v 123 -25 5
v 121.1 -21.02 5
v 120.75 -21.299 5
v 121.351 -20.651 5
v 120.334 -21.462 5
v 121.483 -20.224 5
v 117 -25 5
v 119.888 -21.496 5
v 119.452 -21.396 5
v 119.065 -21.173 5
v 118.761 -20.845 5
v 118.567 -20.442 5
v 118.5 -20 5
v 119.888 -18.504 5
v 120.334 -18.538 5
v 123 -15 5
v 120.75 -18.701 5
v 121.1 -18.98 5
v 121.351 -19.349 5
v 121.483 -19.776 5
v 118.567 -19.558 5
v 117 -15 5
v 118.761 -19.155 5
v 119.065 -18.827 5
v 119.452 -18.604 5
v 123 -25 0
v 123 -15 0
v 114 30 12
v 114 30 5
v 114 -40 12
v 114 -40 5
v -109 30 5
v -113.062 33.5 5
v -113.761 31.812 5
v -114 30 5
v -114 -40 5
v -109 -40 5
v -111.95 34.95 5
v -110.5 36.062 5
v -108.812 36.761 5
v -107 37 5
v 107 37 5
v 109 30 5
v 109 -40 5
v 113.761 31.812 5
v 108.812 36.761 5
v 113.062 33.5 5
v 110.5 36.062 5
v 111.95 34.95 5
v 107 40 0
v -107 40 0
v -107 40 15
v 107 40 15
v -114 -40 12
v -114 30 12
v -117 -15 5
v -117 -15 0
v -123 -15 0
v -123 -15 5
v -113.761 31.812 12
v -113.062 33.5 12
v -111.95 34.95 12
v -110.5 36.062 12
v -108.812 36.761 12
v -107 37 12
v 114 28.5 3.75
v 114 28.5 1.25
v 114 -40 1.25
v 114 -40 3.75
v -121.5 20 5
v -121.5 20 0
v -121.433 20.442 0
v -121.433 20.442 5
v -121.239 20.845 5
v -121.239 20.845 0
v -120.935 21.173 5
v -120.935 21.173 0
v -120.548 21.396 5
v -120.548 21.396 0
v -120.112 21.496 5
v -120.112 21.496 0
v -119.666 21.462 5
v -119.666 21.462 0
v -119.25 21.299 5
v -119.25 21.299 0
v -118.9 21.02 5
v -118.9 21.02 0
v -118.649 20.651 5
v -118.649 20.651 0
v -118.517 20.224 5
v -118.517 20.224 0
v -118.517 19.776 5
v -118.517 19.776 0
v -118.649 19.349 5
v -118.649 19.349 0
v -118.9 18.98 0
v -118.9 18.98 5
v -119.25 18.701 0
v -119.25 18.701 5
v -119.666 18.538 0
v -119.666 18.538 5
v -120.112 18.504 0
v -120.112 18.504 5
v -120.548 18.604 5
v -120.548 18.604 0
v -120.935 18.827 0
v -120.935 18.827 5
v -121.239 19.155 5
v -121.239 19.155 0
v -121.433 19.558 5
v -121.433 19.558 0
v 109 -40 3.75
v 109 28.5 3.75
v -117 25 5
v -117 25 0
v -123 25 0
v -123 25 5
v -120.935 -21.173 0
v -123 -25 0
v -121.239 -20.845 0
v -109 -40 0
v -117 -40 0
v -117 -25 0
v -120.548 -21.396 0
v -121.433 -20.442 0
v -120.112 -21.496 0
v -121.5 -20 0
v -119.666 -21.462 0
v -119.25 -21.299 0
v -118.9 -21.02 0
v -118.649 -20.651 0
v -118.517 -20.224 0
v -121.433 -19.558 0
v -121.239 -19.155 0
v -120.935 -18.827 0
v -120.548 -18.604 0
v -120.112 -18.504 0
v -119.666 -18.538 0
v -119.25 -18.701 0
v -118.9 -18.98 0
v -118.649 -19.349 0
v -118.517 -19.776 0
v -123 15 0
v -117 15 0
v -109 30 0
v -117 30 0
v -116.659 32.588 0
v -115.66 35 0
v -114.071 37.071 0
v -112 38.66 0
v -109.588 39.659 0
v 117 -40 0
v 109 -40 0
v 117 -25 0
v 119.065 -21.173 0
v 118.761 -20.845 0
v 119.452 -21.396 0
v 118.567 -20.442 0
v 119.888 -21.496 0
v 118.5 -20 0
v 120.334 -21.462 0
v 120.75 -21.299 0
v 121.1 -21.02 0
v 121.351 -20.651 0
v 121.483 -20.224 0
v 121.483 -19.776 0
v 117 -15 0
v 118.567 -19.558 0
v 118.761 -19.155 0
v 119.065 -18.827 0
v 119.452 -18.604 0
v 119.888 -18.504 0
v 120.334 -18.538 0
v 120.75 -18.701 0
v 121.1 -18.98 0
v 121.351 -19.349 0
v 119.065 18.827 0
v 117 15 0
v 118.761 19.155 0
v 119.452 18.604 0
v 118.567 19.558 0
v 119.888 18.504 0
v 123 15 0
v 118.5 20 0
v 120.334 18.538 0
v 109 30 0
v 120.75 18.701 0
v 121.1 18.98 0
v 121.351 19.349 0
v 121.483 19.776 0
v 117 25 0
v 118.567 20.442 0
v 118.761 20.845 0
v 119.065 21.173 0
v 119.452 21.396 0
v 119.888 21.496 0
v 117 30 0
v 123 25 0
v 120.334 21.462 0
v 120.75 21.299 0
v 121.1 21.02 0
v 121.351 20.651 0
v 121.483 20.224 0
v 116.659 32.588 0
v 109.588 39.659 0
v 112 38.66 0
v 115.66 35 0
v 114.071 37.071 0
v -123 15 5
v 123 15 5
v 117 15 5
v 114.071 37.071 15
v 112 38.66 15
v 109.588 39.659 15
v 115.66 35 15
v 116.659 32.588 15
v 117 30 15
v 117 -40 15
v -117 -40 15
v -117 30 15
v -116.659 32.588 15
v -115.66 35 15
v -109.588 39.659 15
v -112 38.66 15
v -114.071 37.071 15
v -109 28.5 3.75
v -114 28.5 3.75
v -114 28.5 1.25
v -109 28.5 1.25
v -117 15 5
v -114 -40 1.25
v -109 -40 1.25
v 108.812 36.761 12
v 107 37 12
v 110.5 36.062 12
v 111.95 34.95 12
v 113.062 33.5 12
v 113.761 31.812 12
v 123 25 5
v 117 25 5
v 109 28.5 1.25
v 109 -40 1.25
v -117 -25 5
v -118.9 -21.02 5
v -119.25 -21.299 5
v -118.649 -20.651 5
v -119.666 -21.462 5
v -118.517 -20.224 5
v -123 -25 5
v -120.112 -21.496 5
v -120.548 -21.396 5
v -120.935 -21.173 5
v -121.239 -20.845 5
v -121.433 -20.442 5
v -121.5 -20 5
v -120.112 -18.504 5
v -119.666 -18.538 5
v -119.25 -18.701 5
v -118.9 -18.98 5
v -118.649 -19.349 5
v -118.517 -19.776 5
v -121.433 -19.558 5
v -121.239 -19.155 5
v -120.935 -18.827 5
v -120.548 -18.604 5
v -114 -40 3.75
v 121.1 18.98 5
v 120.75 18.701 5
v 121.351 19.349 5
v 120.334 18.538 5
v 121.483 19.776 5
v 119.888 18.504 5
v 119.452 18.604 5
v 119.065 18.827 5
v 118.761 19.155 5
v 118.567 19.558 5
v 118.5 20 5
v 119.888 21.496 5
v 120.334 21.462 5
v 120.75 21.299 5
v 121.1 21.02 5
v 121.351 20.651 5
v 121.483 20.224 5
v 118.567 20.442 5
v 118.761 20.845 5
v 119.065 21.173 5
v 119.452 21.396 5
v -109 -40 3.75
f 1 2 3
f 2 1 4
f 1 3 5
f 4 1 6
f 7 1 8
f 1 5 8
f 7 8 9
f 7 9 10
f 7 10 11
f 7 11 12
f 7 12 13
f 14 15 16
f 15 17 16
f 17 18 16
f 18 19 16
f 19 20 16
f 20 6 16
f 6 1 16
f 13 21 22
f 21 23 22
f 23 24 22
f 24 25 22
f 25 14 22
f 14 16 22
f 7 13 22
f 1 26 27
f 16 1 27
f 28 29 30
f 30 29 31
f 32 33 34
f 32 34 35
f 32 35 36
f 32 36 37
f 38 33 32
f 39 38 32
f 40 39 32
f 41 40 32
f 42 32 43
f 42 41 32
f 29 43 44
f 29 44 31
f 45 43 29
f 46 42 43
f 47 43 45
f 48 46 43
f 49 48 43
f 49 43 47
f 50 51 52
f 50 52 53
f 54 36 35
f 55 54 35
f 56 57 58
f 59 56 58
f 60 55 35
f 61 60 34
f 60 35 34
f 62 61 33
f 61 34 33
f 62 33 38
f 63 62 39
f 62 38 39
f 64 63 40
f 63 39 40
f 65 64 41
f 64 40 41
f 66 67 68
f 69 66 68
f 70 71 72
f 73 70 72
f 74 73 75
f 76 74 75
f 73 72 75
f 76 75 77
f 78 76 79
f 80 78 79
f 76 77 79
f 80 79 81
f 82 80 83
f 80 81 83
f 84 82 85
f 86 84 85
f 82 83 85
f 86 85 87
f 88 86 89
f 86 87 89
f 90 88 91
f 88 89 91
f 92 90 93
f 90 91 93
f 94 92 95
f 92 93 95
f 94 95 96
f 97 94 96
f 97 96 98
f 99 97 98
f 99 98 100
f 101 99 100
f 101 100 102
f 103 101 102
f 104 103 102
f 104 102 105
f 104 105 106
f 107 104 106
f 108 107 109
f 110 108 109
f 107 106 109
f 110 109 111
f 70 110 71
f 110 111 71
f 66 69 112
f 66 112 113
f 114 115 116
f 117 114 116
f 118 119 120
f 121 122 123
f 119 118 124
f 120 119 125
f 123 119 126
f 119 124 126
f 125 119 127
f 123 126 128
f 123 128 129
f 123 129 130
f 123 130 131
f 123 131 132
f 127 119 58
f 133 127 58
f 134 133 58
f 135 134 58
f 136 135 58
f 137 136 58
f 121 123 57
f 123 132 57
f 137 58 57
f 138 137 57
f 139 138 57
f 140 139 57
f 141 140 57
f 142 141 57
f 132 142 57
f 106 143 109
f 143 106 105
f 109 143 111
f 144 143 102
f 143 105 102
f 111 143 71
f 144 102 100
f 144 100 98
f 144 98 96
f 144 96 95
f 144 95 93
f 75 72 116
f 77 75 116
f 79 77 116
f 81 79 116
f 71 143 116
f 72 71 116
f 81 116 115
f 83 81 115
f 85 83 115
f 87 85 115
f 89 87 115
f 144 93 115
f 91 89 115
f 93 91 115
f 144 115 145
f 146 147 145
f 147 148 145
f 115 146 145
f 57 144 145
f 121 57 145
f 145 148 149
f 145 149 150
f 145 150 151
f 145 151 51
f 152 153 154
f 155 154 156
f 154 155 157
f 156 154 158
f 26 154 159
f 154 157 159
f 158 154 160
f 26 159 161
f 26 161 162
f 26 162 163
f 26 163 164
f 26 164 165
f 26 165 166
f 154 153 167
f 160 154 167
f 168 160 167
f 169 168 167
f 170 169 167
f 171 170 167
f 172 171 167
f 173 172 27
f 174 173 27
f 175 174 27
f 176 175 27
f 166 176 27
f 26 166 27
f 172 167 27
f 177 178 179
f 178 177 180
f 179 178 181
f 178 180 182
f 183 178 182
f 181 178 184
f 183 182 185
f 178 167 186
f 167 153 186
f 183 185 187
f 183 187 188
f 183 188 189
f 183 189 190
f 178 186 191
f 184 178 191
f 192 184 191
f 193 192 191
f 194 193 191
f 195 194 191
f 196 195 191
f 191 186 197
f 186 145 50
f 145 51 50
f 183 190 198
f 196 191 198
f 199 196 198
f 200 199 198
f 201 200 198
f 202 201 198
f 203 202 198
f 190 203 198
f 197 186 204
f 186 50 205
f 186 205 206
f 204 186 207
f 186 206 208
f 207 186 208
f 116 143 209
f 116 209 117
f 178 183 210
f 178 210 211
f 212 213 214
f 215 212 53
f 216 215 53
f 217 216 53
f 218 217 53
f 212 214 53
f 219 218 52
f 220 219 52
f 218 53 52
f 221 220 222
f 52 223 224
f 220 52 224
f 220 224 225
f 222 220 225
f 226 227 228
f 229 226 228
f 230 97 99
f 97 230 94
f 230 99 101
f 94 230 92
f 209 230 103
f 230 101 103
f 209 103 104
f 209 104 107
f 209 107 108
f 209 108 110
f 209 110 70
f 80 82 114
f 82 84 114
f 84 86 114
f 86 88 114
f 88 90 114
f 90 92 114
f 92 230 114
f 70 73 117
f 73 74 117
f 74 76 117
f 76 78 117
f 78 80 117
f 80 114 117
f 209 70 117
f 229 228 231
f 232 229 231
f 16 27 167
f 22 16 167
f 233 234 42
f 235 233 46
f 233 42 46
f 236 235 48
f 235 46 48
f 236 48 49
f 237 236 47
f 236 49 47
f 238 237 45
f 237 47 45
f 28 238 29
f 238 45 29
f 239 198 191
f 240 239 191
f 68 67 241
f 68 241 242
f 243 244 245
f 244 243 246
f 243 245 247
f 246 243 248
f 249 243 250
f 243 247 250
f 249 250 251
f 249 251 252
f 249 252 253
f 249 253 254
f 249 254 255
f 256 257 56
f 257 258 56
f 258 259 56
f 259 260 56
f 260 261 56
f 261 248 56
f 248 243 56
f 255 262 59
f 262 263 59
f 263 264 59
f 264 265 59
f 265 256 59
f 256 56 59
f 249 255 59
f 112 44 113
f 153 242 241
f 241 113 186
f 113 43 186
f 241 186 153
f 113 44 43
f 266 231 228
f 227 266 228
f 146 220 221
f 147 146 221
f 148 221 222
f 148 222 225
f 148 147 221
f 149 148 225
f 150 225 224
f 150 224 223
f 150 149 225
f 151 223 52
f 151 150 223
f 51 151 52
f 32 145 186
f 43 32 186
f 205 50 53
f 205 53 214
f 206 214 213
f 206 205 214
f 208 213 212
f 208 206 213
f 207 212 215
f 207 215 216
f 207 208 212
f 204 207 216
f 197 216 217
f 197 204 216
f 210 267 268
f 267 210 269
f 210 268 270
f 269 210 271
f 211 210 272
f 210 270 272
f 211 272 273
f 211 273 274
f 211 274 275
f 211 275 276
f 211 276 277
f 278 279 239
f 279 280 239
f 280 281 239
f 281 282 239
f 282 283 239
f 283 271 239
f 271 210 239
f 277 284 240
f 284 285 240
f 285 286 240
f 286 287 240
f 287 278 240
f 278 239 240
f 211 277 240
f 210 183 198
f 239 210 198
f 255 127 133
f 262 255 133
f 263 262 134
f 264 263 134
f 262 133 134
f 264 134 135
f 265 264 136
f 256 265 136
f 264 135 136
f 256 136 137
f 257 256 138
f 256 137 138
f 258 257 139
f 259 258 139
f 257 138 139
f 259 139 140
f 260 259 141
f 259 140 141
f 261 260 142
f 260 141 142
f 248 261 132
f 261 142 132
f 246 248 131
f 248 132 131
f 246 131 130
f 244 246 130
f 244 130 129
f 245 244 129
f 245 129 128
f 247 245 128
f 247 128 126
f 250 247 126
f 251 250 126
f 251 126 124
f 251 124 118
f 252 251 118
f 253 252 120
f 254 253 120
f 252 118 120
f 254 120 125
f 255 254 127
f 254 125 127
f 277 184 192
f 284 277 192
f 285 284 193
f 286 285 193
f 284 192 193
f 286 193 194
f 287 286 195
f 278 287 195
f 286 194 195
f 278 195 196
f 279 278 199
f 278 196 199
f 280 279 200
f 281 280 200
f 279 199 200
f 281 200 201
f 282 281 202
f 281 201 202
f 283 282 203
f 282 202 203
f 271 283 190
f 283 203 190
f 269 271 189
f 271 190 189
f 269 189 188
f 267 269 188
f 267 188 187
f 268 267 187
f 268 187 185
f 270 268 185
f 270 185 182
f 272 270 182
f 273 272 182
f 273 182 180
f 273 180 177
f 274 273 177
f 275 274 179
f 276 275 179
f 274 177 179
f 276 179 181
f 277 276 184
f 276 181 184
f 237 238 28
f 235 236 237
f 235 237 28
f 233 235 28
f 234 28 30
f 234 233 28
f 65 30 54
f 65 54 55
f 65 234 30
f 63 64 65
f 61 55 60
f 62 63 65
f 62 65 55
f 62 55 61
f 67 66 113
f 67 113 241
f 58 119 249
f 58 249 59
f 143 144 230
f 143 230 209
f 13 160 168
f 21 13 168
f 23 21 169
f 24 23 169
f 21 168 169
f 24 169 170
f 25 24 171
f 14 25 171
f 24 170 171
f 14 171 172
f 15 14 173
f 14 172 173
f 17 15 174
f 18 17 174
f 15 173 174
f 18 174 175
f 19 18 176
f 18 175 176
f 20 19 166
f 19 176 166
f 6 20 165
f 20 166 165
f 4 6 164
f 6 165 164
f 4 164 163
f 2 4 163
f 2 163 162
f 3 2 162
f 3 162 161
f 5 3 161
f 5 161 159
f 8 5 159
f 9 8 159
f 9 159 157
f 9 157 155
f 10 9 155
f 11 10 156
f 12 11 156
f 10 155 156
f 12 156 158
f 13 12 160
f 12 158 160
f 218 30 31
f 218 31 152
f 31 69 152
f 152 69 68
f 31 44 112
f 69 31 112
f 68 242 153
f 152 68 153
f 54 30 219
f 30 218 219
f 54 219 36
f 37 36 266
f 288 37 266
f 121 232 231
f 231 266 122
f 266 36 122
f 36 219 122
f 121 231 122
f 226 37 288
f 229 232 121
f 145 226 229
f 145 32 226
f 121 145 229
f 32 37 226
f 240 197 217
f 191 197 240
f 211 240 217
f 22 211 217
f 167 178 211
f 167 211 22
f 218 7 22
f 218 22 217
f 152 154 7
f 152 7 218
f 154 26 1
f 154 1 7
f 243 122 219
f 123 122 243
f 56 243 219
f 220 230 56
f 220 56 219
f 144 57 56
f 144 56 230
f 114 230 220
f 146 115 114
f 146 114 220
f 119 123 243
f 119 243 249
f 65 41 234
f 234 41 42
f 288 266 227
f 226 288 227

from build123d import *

# Parameters (mm, degrees)
BOSS_EXTRU_1_DEPTH      = 15
COQUE1_T                = -3
ESQUISSE3_W             = 228
ESQUISSE3_H             = 3
ENL_V_MAT_EXTRU_2_DEPTH = 12
BOSS_EXTRU_3_DEPTH      = 5
BOSS_EXTRU_4_DEPTH      = 5
ESQUISSE2_W             = 6
ESQUISSE2_H             = 10
ESQUISSE2_R             = 1.5
BOSS_EXTRU_6_DEPTH      = 5


with BuildPart() as part:
    # Esquisse1 → Boss.-Extru.1 (new body)
    with BuildSketch(Plane.XY):
        with BuildLine():
            Line((-107, 40), (107, 40))
            ThreePointArc((107, 40), (114.071067812, 37.071067812), (117, 30))
            Line((117, 30), (117, -40))
            Line((117, -40), (-117, -40))
            Line((-117, -40), (-117, 30))
            ThreePointArc((-117, 30), (-114.071067812, 37.071067812), (-107, 40))
        make_face()
    extrude(amount=BOSS_EXTRU_1_DEPTH)

    # Coque1
    coque1_openings = [part.faces().sort_by_distance(p)[0] for p in [
        (0, -0.086787891, 0),
    ]]
    offset(amount=COQUE1_T, openings=coque1_openings, kind=Kind.INTERSECTION)

    # Esquisse3 → Enlèv. mat.-Extru.2 (cut)
    with BuildSketch(Plane(origin=(0, 0, 0), x_dir=(-1, 0, 0), z_dir=(0, 0, -1))):
        with Locations((0, -38.5)):
            Rectangle(ESQUISSE3_W, ESQUISSE3_H)
    extrude(amount=-ENL_V_MAT_EXTRU_2_DEPTH, mode=Mode.SUBTRACT)

    # Esquisse4 → Boss.-Extru.3 (add)
    with BuildSketch(Plane.ZY.offset(-114)):
        Polygon((0, -40), (0, 30), (5, 30), (5, -40), (3.75, -40), (3.75, 28.5), (1.25, 28.5), (1.25, -40), align=None)
    boss_extru_3 = extrude(amount=BOSS_EXTRU_3_DEPTH)

    # Symétrie1: Boss.-Extru.3 across plane
    add(boss_extru_3.mirror(Plane(origin=(0, 0, 0), x_dir=(0, 0, 1), z_dir=(1, 0, 0))))

    # Esquisse5 → Boss.-Extru.4 (add)
    with BuildSketch(Plane(origin=(0, 0, 0), x_dir=(-1, 0, 0), z_dir=(0, 0, -1))):
        with BuildLine():
            Line((-107, 37), (107, 37))
            ThreePointArc((107, 37), (111.949747468, 34.949747468), (114, 30))
            Line((114, 30), (-114, 30))
            ThreePointArc((-114, 30), (-111.949747468, 34.949747468), (-107, 37))
        make_face()
    extrude(amount=-BOSS_EXTRU_4_DEPTH)

    # Esquisse2 → Boss.-Extru.6 (add)
    # profile 1 of 4: a face of its own
    with BuildSketch(Plane(origin=(0, 0, 0), x_dir=(-1, 0, 0), z_dir=(0, 0, -1))):
        with Locations((-120, -20)):
            Rectangle(ESQUISSE2_W, ESQUISSE2_H)
        with Locations((-120, -20)):
            Circle(ESQUISSE2_R, mode=Mode.SUBTRACT)
    # profile 2 of 4: a face of its own
    with BuildSketch(Plane(origin=(0, 0, 0), x_dir=(-1, 0, 0), z_dir=(0, 0, -1))):
        with Locations((-120, 20)):
            Rectangle(ESQUISSE2_W, ESQUISSE2_H)
        with Locations((-120, 20)):
            Circle(ESQUISSE2_R, mode=Mode.SUBTRACT)
    # profile 3 of 4: a face of its own
    with BuildSketch(Plane(origin=(0, 0, 0), x_dir=(-1, 0, 0), z_dir=(0, 0, -1))):
        with Locations((120, 20)):
            Rectangle(ESQUISSE2_W, ESQUISSE2_H)
        with Locations((120, 20)):
            Circle(ESQUISSE2_R, mode=Mode.SUBTRACT)
    # profile 4 of 4: a face of its own
    with BuildSketch(Plane(origin=(0, 0, 0), x_dir=(-1, 0, 0), z_dir=(0, 0, -1))):
        with Locations((120, -20)):
            Rectangle(ESQUISSE2_W, ESQUISSE2_H)
        with Locations((120, -20)):
            Circle(ESQUISSE2_R, mode=Mode.SUBTRACT)
    extrude(amount=-BOSS_EXTRU_6_DEPTH)


solid = part.part
